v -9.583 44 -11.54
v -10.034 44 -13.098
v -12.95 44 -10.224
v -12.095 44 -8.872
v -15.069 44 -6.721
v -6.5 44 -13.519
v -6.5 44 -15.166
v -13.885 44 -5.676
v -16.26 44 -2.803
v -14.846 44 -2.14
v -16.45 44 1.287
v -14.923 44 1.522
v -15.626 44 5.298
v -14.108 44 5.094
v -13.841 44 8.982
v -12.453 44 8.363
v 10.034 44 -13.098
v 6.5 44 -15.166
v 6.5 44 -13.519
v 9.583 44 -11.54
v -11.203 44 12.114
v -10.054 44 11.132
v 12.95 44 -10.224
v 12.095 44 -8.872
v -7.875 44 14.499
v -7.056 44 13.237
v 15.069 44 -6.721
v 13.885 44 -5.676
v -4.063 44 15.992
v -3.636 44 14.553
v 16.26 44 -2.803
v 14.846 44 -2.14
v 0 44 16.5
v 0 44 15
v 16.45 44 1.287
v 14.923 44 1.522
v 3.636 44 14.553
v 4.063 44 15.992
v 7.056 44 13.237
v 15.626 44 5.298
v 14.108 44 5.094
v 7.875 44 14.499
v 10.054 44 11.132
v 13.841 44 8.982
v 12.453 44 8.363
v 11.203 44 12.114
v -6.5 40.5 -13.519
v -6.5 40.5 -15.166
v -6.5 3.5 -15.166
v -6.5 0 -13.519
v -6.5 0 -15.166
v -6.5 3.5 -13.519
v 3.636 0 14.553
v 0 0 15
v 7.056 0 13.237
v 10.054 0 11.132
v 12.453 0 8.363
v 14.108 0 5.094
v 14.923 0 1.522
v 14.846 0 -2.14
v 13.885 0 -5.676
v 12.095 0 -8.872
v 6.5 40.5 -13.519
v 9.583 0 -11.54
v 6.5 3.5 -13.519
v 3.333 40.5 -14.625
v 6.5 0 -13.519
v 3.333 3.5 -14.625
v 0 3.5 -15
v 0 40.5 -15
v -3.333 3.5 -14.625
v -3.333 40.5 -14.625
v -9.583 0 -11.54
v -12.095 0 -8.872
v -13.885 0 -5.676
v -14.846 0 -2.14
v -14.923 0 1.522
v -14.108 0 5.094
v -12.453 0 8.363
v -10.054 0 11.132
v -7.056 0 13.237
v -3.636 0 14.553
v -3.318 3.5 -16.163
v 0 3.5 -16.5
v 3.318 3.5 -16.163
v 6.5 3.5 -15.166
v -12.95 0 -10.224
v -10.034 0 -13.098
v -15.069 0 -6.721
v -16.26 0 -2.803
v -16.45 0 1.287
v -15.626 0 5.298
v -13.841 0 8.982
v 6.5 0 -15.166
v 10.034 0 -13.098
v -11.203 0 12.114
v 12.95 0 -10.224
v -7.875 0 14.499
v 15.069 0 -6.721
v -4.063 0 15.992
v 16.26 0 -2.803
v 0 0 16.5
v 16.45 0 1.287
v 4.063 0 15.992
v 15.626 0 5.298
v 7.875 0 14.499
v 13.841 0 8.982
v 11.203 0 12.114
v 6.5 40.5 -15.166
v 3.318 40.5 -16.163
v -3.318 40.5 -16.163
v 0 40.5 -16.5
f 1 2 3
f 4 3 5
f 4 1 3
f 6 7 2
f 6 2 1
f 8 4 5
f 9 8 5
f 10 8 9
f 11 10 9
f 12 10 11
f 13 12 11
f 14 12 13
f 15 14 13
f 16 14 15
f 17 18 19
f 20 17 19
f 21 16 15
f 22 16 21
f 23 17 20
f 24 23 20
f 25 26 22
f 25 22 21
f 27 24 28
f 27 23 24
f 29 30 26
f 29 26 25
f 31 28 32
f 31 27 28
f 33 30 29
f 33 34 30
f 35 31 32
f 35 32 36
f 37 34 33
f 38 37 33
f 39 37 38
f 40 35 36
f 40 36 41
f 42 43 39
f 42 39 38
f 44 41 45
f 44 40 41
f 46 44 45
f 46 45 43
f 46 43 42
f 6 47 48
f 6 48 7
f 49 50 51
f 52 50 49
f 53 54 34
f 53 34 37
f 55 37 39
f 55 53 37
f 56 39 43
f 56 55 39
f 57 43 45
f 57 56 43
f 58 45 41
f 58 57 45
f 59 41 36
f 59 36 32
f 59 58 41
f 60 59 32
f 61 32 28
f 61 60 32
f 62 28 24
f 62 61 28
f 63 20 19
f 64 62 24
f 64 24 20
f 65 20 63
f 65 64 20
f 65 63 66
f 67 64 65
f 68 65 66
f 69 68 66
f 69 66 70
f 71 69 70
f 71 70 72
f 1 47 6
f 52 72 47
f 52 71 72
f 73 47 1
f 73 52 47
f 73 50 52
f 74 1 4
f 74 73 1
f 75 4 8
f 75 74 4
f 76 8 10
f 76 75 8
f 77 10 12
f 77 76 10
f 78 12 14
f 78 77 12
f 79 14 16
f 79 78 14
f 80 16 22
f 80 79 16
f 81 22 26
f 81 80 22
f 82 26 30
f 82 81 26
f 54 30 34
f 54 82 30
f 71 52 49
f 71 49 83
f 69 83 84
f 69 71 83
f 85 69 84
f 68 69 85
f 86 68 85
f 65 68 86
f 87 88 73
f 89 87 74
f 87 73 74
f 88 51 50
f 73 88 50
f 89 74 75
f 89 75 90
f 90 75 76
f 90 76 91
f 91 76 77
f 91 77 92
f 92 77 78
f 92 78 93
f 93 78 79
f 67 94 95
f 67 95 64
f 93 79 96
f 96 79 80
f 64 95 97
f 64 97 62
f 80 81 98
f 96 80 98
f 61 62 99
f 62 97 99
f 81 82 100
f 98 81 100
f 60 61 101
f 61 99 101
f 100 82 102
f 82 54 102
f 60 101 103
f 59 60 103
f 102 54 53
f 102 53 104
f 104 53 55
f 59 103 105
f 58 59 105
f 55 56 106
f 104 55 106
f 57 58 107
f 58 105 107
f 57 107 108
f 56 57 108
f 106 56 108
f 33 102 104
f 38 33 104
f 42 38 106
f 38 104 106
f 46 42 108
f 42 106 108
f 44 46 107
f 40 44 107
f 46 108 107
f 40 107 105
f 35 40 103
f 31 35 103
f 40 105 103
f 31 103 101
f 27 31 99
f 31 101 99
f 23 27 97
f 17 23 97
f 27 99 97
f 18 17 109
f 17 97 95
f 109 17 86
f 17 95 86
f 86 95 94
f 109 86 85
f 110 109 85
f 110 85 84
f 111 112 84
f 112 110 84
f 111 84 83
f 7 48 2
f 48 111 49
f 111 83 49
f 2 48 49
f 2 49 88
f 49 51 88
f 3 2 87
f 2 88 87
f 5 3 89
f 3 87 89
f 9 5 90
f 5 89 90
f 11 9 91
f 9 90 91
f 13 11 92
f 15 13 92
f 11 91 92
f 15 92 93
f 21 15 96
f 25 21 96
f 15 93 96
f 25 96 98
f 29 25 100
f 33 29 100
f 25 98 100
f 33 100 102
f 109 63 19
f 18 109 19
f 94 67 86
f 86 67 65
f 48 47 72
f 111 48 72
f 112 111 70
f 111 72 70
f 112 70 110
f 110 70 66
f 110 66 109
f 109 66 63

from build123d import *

# Parameters (mm, degrees)
SKETCH1_R           = 16.5
SKETCH1_R_2         = 15
BOSS_EXTRUDE1_DEPTH = 44
SKETCH3_W           = 13
SKETCH3_H           = 3.5
CUT_EXTRUDE1_DEPTH  = 44


with BuildPart() as part:
    # Sketch1 → Boss-Extrude1 (new body)
    with BuildSketch(Plane(origin=(0, 0, 0), x_dir=(1, 0, 0), z_dir=(0, 1, 0))):
        with Locations(Location((0, 0, 0), (0, 0, 270))):
            Circle(SKETCH1_R)
        with Locations(Location((0, 0, 0), (0, 0, 270))):
            Circle(SKETCH1_R_2, mode=Mode.SUBTRACT)
    extrude(amount=BOSS_EXTRUDE1_DEPTH)

    # Sketch3 → Cut-Extrude1 (cut)
    with BuildSketch(Plane.XY):
        with Locations((0, 1.75)):
            Rectangle(SKETCH3_W, SKETCH3_H)
        with Locations((0, 42.25)):
            Rectangle(SKETCH3_W, SKETCH3_H)
    extrude(amount=-CUT_EXTRUDE1_DEPTH, mode=Mode.SUBTRACT)


solid = part.part
